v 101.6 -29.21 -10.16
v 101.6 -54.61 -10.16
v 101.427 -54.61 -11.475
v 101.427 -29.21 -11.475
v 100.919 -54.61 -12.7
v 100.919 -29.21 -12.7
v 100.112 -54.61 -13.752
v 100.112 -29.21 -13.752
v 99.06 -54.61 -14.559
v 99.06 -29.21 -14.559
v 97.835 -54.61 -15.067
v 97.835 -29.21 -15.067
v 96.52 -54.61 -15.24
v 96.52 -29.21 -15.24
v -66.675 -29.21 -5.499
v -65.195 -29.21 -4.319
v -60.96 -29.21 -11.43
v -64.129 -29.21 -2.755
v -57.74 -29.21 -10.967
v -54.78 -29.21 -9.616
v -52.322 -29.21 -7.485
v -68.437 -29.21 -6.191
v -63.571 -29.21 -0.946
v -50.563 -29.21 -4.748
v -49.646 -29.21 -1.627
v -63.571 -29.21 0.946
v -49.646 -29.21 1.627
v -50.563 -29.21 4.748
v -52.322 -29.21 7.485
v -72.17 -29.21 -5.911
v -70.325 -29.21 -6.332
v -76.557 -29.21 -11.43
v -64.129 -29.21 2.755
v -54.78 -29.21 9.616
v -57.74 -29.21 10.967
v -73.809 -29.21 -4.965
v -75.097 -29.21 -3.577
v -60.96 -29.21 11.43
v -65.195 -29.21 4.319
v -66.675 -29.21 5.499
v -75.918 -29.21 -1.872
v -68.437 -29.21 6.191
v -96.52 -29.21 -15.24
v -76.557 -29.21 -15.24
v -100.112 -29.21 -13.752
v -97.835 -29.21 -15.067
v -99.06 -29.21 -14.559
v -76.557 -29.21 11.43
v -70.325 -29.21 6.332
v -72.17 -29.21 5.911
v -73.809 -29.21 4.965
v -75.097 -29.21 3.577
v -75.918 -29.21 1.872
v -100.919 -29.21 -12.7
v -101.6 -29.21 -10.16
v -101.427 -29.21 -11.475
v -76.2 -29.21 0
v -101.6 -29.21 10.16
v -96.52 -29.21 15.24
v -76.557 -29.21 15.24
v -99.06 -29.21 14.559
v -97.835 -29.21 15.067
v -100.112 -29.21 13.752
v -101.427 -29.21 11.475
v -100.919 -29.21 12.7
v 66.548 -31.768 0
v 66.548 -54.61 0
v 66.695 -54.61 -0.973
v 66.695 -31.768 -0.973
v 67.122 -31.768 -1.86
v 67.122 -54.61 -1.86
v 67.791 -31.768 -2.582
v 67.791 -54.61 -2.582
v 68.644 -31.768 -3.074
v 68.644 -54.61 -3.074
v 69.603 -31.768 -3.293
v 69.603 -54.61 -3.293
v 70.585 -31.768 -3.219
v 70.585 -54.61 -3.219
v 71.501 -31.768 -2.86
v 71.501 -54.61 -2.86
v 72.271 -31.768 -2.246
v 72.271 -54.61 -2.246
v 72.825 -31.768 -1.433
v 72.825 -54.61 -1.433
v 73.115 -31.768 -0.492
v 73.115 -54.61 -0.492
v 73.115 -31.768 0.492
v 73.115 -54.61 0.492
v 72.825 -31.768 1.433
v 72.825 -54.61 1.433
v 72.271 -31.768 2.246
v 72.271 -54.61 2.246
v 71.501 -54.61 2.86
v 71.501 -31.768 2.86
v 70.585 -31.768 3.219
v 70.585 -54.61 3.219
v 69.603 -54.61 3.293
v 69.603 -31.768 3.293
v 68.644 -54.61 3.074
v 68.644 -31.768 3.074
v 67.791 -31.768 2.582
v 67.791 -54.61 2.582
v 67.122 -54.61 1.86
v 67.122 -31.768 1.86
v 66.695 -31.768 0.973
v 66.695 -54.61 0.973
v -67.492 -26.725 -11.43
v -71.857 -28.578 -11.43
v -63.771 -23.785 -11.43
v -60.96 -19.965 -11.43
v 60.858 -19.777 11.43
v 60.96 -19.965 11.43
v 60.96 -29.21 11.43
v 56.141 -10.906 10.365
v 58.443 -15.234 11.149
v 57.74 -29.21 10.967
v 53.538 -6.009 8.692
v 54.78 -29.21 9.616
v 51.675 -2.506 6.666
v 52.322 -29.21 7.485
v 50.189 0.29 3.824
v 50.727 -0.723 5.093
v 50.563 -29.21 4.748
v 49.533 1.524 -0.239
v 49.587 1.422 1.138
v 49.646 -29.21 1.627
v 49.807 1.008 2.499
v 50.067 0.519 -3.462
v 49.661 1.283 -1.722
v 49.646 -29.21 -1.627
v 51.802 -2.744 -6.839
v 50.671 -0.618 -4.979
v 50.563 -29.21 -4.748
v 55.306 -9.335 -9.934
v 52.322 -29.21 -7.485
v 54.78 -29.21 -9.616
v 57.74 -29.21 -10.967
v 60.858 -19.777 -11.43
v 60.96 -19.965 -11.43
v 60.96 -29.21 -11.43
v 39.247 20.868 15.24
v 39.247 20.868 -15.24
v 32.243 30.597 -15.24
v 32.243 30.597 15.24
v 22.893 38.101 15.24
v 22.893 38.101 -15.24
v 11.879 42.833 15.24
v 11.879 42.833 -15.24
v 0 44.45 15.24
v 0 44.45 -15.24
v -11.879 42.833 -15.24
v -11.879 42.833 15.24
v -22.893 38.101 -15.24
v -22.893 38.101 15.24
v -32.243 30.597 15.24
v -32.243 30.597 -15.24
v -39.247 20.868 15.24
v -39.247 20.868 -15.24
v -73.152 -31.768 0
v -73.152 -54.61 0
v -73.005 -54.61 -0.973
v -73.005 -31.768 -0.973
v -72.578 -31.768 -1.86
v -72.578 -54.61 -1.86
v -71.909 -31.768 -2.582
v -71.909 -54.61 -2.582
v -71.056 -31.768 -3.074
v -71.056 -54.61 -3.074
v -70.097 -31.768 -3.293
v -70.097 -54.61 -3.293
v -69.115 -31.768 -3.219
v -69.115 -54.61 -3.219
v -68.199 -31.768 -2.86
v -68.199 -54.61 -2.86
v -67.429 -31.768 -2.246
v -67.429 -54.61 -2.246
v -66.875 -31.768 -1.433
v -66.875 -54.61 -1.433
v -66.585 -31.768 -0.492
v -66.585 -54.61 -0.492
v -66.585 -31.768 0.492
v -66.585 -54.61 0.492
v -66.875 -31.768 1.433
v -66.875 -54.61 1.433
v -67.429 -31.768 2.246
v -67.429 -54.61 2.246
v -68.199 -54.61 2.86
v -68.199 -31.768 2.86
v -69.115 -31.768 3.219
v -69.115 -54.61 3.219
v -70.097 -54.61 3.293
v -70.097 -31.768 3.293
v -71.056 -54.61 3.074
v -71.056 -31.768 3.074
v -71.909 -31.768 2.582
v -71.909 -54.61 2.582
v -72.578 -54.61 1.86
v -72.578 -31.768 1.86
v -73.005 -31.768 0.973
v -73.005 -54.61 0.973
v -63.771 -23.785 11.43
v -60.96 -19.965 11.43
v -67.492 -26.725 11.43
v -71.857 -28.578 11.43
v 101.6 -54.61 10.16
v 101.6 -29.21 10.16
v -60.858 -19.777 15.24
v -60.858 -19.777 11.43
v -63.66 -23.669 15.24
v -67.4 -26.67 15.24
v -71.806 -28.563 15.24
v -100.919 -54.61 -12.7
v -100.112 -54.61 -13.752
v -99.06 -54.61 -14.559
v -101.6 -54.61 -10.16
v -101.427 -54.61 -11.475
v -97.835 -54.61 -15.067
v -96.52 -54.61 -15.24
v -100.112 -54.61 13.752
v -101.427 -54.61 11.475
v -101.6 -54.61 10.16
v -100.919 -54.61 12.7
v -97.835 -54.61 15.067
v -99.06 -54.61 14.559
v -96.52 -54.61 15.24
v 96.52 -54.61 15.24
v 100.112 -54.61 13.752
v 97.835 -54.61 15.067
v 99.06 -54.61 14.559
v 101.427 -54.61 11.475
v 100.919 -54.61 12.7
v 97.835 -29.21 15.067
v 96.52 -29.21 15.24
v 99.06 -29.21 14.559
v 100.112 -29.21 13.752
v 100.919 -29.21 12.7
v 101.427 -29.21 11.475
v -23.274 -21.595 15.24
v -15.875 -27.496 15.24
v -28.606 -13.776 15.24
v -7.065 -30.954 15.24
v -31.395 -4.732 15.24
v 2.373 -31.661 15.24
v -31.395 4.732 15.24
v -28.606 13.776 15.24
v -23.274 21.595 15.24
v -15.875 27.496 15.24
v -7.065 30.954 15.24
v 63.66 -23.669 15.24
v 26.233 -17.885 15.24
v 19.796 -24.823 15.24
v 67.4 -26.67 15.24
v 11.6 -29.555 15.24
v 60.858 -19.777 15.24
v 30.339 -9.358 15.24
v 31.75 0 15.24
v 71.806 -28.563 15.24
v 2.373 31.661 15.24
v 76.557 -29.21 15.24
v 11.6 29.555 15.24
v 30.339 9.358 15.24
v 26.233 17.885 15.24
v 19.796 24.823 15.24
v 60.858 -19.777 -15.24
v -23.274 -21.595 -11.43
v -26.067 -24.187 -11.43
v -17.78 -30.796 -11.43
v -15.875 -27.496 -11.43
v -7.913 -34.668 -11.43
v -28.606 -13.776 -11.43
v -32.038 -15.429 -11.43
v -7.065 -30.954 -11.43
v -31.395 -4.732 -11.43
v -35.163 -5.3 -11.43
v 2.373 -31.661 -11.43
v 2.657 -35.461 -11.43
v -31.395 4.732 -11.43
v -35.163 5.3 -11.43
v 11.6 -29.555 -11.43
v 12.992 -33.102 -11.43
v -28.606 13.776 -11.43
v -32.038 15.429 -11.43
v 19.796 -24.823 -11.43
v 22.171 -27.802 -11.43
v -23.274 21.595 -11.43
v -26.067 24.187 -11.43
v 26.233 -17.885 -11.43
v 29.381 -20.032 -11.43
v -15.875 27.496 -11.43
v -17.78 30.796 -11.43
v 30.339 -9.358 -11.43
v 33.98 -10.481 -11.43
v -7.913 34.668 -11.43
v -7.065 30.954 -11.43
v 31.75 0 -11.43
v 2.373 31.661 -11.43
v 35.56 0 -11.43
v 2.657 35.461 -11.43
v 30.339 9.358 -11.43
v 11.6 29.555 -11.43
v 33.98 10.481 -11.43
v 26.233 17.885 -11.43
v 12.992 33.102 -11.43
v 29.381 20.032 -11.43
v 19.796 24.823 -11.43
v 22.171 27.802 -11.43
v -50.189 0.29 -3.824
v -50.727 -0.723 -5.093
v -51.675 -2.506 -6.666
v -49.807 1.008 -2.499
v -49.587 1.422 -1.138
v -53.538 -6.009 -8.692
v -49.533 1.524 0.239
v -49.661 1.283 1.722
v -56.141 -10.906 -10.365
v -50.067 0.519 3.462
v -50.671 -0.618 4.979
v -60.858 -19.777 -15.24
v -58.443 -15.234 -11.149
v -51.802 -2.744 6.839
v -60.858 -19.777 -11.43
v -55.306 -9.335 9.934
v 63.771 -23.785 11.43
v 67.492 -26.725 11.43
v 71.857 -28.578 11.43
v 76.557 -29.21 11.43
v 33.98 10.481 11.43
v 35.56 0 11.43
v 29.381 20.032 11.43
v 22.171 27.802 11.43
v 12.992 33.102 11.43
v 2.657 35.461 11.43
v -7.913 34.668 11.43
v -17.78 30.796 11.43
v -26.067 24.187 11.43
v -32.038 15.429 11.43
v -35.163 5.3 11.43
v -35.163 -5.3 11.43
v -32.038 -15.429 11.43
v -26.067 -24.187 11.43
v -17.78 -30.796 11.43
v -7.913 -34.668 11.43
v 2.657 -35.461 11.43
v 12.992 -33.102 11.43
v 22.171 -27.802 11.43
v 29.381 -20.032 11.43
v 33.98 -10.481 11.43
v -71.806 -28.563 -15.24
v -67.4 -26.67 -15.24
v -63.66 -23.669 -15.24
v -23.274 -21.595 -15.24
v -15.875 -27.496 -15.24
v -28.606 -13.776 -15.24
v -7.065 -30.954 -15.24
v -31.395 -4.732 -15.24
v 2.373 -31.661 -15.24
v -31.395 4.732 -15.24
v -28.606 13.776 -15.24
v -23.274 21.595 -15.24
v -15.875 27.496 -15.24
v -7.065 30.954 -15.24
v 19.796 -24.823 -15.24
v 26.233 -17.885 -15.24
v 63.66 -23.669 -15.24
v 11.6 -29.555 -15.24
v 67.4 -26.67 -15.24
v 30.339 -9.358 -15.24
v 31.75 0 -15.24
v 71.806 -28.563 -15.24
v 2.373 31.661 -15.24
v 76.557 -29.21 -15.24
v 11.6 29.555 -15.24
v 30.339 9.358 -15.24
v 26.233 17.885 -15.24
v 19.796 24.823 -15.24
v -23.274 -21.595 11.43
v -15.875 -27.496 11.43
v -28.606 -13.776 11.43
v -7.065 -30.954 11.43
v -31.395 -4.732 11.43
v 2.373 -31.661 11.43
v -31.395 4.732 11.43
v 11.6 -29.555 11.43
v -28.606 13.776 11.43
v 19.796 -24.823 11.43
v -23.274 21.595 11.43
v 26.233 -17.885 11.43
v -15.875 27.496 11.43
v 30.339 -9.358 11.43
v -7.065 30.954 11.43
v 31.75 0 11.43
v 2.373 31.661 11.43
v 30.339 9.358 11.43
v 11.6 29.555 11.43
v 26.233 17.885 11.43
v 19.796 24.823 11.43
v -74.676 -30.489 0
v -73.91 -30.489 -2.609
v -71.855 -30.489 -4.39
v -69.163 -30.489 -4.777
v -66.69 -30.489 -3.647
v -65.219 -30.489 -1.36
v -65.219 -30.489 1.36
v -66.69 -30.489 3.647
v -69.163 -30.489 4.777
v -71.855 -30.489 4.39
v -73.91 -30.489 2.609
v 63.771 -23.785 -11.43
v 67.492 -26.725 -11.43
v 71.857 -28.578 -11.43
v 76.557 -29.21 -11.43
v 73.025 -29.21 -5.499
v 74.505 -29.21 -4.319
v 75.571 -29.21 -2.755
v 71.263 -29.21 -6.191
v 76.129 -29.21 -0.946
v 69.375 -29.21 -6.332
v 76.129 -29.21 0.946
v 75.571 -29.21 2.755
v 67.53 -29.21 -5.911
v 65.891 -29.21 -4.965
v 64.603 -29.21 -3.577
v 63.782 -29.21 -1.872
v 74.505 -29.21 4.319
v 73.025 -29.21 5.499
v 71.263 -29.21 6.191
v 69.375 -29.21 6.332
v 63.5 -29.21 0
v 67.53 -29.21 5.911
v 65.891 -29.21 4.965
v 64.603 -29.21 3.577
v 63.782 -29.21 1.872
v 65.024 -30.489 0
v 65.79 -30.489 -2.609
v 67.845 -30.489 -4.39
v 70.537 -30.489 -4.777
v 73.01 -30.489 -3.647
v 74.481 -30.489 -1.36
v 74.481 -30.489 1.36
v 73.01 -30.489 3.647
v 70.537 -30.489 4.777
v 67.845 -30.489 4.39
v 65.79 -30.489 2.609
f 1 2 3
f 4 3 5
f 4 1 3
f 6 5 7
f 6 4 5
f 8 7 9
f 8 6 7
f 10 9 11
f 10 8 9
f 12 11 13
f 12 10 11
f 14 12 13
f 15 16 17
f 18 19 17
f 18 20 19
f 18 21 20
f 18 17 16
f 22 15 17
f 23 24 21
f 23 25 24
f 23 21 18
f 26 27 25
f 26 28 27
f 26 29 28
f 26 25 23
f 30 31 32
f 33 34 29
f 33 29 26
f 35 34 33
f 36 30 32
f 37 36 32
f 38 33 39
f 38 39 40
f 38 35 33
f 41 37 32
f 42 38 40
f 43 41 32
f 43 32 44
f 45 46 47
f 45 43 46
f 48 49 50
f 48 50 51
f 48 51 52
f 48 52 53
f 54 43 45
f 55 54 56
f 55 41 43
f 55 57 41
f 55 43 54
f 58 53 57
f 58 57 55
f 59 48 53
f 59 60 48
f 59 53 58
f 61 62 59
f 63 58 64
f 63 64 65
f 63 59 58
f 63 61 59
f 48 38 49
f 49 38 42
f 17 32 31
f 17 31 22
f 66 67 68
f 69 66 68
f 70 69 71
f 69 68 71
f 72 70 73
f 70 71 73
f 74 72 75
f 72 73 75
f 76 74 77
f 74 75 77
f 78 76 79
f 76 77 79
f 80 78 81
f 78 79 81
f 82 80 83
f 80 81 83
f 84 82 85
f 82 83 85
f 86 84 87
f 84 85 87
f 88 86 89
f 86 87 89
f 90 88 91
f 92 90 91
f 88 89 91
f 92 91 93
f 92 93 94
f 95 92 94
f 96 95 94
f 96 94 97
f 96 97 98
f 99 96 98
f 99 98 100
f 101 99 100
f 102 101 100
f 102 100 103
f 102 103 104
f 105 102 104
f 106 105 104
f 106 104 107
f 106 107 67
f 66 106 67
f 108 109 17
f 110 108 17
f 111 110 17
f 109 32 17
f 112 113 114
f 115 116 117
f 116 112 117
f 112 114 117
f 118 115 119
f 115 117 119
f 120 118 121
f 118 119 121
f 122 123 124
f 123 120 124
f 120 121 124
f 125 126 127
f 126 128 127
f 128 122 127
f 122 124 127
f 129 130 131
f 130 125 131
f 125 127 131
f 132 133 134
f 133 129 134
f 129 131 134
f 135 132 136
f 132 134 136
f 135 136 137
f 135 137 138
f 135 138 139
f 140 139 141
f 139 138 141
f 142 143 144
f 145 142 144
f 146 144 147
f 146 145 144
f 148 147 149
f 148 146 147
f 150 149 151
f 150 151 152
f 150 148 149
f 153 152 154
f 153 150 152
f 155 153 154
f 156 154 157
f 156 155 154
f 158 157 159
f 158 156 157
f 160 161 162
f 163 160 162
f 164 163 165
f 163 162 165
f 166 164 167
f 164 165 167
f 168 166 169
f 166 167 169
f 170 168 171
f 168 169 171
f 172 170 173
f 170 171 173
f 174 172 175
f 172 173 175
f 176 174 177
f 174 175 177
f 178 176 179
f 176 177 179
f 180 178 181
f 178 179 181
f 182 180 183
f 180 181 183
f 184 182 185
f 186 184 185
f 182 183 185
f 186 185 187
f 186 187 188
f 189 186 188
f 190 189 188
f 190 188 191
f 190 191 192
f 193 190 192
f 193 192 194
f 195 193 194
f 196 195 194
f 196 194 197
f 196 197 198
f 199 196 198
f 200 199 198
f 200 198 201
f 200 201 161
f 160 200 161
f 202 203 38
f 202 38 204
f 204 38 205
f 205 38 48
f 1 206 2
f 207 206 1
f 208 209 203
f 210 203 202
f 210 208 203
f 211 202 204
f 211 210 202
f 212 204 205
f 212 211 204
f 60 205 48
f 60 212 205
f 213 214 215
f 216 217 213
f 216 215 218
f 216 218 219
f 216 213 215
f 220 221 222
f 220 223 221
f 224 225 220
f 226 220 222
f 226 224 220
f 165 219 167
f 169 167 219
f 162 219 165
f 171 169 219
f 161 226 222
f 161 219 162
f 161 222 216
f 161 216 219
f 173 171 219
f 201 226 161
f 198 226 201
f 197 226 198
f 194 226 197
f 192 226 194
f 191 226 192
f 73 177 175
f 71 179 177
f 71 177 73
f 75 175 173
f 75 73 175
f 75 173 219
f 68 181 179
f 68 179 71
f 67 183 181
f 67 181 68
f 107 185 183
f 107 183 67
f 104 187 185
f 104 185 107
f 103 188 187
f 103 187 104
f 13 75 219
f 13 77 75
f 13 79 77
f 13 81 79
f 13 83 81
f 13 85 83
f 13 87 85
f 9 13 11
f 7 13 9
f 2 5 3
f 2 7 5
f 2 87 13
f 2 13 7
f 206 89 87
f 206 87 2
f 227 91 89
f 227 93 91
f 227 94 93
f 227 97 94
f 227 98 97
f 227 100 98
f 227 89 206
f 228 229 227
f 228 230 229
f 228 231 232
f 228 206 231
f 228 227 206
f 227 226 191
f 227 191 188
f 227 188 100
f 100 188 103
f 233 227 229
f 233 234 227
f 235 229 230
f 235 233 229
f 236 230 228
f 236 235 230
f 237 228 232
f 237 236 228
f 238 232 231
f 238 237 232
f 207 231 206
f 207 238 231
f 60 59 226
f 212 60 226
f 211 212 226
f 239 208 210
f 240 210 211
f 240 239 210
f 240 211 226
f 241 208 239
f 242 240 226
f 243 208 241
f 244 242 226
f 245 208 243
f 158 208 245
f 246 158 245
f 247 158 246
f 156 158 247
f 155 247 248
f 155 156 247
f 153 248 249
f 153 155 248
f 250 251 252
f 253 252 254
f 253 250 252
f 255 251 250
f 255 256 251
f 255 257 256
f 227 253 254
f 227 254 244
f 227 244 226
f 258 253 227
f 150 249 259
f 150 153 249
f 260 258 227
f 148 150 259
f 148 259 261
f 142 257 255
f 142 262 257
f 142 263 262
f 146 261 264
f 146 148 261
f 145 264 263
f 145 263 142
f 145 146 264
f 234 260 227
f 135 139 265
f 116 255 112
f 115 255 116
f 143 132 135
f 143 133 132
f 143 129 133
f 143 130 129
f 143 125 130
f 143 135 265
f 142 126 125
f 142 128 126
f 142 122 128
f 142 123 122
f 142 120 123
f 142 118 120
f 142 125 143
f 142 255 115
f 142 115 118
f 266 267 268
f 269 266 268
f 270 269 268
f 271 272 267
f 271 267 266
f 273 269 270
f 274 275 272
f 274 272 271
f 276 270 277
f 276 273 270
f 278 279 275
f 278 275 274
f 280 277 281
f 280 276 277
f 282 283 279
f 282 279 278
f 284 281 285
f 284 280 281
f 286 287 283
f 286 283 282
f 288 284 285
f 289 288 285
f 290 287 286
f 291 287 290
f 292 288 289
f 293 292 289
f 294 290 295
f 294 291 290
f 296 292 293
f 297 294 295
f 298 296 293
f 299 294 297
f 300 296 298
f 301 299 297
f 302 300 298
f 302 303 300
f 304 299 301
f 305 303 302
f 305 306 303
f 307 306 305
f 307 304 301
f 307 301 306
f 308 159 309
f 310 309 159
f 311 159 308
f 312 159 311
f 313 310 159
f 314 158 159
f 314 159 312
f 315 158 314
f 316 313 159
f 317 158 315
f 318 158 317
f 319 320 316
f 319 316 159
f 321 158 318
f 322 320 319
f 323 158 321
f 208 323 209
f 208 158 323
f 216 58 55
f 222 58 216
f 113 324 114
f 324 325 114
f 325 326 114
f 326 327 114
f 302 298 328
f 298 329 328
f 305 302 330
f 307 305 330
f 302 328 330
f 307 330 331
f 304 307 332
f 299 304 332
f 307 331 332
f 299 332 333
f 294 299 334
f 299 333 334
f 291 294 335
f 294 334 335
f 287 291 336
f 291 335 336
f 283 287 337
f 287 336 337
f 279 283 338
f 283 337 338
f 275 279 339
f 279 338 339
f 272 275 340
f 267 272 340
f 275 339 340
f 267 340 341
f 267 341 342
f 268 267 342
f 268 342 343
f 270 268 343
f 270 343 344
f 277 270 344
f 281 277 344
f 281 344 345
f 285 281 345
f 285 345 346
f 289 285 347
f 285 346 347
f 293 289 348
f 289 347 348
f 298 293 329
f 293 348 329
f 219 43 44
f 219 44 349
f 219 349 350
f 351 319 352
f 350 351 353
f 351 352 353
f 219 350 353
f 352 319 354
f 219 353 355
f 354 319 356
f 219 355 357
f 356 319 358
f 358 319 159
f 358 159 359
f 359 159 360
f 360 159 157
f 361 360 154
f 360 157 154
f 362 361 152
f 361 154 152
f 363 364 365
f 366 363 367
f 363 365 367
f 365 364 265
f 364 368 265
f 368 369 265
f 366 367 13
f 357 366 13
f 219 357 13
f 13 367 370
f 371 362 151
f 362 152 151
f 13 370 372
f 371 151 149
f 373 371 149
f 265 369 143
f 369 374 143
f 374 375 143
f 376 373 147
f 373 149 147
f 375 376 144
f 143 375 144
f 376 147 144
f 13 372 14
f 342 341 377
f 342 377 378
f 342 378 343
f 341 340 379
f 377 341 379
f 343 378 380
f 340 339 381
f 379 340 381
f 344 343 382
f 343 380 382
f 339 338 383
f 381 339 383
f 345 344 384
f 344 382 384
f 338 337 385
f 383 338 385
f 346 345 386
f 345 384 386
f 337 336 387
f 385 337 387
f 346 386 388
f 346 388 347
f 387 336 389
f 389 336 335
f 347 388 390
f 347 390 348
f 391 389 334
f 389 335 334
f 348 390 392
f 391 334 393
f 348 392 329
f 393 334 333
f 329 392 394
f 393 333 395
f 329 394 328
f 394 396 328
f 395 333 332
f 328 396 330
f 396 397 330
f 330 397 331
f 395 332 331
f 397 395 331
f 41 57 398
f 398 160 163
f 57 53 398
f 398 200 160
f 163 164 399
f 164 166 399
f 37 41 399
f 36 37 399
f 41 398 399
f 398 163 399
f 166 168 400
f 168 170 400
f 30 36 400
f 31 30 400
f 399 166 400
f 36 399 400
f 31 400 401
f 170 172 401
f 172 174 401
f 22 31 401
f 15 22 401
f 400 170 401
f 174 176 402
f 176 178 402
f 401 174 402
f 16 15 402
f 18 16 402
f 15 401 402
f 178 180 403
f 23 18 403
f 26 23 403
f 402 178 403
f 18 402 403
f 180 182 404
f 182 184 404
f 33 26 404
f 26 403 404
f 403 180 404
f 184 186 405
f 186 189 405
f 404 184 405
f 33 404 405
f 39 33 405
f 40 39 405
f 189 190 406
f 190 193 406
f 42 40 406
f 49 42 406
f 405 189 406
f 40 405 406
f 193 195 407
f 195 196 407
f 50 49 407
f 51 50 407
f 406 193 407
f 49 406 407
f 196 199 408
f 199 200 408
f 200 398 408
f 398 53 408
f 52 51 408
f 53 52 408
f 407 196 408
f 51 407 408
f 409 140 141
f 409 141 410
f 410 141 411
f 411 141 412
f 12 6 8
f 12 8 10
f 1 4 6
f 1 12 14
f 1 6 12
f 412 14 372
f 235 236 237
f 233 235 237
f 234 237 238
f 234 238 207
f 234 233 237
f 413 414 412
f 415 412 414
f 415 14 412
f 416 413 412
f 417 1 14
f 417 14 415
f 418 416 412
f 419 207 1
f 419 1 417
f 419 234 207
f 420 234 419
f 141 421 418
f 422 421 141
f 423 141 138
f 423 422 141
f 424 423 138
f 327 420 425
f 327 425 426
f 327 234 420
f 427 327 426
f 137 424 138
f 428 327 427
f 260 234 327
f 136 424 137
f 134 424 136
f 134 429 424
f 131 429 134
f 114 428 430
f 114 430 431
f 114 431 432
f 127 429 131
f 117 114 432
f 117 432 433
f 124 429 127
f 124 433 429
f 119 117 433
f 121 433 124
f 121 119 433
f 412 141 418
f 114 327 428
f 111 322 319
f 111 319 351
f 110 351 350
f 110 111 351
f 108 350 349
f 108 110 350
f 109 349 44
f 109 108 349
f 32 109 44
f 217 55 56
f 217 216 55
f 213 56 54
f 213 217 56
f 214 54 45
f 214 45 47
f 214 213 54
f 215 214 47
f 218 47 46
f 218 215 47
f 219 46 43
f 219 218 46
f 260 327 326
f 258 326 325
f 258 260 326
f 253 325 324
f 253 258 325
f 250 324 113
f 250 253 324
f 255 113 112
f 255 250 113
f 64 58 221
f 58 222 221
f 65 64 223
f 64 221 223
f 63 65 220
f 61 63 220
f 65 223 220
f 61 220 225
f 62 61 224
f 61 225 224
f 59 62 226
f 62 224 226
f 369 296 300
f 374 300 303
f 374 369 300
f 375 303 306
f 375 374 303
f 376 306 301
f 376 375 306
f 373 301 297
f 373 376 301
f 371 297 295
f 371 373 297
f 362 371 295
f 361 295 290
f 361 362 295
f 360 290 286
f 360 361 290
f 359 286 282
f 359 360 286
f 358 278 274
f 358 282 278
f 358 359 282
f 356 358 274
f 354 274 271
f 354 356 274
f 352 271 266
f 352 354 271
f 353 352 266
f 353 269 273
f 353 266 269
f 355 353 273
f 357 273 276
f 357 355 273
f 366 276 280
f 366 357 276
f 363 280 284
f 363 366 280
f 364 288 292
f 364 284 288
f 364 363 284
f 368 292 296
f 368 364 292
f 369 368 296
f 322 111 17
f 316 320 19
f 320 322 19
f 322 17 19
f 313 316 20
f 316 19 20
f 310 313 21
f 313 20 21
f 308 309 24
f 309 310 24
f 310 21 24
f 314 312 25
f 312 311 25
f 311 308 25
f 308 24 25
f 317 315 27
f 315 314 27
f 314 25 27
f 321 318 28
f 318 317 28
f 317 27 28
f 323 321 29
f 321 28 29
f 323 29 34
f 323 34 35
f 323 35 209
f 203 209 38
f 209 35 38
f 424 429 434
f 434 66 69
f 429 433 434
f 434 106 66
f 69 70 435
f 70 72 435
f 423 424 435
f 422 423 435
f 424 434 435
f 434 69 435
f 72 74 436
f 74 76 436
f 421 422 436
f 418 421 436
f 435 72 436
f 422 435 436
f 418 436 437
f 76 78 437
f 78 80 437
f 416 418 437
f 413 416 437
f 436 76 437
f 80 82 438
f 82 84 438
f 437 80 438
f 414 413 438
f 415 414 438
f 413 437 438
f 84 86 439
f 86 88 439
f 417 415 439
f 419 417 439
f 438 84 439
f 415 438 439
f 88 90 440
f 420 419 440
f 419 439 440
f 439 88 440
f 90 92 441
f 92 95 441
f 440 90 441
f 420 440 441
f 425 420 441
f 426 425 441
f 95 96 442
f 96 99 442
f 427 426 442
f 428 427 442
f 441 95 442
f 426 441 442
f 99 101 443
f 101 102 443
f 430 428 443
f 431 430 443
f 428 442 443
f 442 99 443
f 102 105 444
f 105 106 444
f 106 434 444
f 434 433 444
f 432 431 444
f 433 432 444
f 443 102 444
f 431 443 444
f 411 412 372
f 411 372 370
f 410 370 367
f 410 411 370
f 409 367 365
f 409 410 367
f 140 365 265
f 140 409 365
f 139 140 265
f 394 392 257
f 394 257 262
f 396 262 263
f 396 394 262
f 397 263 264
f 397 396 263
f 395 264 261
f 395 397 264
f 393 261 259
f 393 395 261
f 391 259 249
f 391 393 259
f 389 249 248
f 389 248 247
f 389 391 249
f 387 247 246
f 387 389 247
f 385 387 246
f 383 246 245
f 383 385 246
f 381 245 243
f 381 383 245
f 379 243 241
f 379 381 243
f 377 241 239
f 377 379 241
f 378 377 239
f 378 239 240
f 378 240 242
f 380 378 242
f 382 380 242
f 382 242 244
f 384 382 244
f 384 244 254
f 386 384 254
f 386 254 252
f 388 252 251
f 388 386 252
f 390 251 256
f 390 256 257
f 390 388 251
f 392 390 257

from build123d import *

# Parameters (mm, degrees)
SKETCH1_R                             = 31.75
BOSS_EXTRUDE1_DEPTH                   = 15.24
FILLET1_R                             = 5.08
CUT_EXTRUDE2_DEPTH                    = 74.66
F_1_4_0_26_DIAMETER_HOLE1_D           = 6.604
F_1_4_0_26_DIAMETER_HOLE1_DEPTH       = 25.4
F_1_4_0_26_DIAMETER_HOLE1_CSINK_D     = 12.7
F_1_4_0_26_DIAMETER_HOLE1_CSINK_ANGLE = 100
SKETCH5_R                             = 35.56
CUT_EXTRUDE3_DEPTH                    = 11.43


with BuildPart() as part:
    # Sketch1 → Boss-Extrude1 (new body, symmetric)
    with BuildSketch(Plane.XY):
        with BuildLine():
            Line((-101.6, -54.61), (101.6, -54.61))
            Line((101.6, -54.61), (101.6, -29.21))
            Line((101.6, -29.21), (76.557273058, -29.21))
            ThreePointArc((76.557273058, -29.21), (67.399896086, -26.670434606), (60.858464857, -19.777204386))
            Line((60.858464857, -19.777204386), (39.247020503, 20.868010966))
            ThreePointArc((39.247020503, 20.868010966), (0, 44.45), (-39.247020503, 20.868010966))
            Line((-39.247020503, 20.868010966), (-60.858464857, -19.777204386))
            ThreePointArc((-60.858464857, -19.777204386), (-67.399896086, -26.670434606), (-76.557273058, -29.21))
            Line((-76.557273058, -29.21), (-101.6, -29.21))
            Line((-101.6, -29.21), (-101.6, -54.61))
        make_face()
        Circle(SKETCH1_R, mode=Mode.SUBTRACT)
    extrude(amount=BOSS_EXTRUDE1_DEPTH, both=True)

    # Fillet1
    fillet1_edges = [part.edges().sort_by_distance(p)[0] for p in [
        (101.6, -41.91, 15.24),
        (101.6, -41.91, -15.24),
        (-101.6, -41.91, -15.24),
        (-101.6, -41.91, 15.24),
    ]]
    fillet(fillet1_edges, radius=FILLET1_R)

    # Sketch2 → Cut-Extrude2 (cut, through all)
    with BuildSketch(Plane(origin=(0, -29.21, 0), x_dir=(1, 0, 0), z_dir=(0, 1, 0))):
        with BuildLine():
            Line((-93.98, 11.43), (-60.96, 11.43))
            ThreePointArc((-60.96, 11.43), (-49.53, 0), (-60.96, -11.43))
            Line((-60.96, -11.43), (-93.98, -11.43))
            Line((-93.98, -11.43), (-93.98, 11.43))
        make_face()
        with BuildLine():
            Line((93.98, 11.43), (93.98, -11.43))
            Line((93.98, -11.43), (60.96, -11.43))
            ThreePointArc((60.96, -11.43), (49.53, 0), (60.96, 11.43))
            Line((60.96, 11.43), (93.98, 11.43))
        make_face()
    extrude(amount=CUT_EXTRUDE2_DEPTH, mode=Mode.SUBTRACT)

    # 1/4 (0.26) Diameter Hole1
    with Locations(Plane(origin=(0, -29.21, 0), x_dir=(1, 0, 0), z_dir=(0, 1, 0))):
        with Locations((-69.85, 0), (69.85, 0)):
            CounterSinkHole(F_1_4_0_26_DIAMETER_HOLE1_D / 2, F_1_4_0_26_DIAMETER_HOLE1_CSINK_D / 2, depth=F_1_4_0_26_DIAMETER_HOLE1_DEPTH, counter_sink_angle=F_1_4_0_26_DIAMETER_HOLE1_CSINK_ANGLE)

    # Sketch5 → Cut-Extrude3 (cut, symmetric)
    with BuildSketch(Plane.XY):
        Circle(SKETCH5_R)
    extrude(amount=CUT_EXTRUDE3_DEPTH, both=True, mode=Mode.SUBTRACT)


solid = part.part
